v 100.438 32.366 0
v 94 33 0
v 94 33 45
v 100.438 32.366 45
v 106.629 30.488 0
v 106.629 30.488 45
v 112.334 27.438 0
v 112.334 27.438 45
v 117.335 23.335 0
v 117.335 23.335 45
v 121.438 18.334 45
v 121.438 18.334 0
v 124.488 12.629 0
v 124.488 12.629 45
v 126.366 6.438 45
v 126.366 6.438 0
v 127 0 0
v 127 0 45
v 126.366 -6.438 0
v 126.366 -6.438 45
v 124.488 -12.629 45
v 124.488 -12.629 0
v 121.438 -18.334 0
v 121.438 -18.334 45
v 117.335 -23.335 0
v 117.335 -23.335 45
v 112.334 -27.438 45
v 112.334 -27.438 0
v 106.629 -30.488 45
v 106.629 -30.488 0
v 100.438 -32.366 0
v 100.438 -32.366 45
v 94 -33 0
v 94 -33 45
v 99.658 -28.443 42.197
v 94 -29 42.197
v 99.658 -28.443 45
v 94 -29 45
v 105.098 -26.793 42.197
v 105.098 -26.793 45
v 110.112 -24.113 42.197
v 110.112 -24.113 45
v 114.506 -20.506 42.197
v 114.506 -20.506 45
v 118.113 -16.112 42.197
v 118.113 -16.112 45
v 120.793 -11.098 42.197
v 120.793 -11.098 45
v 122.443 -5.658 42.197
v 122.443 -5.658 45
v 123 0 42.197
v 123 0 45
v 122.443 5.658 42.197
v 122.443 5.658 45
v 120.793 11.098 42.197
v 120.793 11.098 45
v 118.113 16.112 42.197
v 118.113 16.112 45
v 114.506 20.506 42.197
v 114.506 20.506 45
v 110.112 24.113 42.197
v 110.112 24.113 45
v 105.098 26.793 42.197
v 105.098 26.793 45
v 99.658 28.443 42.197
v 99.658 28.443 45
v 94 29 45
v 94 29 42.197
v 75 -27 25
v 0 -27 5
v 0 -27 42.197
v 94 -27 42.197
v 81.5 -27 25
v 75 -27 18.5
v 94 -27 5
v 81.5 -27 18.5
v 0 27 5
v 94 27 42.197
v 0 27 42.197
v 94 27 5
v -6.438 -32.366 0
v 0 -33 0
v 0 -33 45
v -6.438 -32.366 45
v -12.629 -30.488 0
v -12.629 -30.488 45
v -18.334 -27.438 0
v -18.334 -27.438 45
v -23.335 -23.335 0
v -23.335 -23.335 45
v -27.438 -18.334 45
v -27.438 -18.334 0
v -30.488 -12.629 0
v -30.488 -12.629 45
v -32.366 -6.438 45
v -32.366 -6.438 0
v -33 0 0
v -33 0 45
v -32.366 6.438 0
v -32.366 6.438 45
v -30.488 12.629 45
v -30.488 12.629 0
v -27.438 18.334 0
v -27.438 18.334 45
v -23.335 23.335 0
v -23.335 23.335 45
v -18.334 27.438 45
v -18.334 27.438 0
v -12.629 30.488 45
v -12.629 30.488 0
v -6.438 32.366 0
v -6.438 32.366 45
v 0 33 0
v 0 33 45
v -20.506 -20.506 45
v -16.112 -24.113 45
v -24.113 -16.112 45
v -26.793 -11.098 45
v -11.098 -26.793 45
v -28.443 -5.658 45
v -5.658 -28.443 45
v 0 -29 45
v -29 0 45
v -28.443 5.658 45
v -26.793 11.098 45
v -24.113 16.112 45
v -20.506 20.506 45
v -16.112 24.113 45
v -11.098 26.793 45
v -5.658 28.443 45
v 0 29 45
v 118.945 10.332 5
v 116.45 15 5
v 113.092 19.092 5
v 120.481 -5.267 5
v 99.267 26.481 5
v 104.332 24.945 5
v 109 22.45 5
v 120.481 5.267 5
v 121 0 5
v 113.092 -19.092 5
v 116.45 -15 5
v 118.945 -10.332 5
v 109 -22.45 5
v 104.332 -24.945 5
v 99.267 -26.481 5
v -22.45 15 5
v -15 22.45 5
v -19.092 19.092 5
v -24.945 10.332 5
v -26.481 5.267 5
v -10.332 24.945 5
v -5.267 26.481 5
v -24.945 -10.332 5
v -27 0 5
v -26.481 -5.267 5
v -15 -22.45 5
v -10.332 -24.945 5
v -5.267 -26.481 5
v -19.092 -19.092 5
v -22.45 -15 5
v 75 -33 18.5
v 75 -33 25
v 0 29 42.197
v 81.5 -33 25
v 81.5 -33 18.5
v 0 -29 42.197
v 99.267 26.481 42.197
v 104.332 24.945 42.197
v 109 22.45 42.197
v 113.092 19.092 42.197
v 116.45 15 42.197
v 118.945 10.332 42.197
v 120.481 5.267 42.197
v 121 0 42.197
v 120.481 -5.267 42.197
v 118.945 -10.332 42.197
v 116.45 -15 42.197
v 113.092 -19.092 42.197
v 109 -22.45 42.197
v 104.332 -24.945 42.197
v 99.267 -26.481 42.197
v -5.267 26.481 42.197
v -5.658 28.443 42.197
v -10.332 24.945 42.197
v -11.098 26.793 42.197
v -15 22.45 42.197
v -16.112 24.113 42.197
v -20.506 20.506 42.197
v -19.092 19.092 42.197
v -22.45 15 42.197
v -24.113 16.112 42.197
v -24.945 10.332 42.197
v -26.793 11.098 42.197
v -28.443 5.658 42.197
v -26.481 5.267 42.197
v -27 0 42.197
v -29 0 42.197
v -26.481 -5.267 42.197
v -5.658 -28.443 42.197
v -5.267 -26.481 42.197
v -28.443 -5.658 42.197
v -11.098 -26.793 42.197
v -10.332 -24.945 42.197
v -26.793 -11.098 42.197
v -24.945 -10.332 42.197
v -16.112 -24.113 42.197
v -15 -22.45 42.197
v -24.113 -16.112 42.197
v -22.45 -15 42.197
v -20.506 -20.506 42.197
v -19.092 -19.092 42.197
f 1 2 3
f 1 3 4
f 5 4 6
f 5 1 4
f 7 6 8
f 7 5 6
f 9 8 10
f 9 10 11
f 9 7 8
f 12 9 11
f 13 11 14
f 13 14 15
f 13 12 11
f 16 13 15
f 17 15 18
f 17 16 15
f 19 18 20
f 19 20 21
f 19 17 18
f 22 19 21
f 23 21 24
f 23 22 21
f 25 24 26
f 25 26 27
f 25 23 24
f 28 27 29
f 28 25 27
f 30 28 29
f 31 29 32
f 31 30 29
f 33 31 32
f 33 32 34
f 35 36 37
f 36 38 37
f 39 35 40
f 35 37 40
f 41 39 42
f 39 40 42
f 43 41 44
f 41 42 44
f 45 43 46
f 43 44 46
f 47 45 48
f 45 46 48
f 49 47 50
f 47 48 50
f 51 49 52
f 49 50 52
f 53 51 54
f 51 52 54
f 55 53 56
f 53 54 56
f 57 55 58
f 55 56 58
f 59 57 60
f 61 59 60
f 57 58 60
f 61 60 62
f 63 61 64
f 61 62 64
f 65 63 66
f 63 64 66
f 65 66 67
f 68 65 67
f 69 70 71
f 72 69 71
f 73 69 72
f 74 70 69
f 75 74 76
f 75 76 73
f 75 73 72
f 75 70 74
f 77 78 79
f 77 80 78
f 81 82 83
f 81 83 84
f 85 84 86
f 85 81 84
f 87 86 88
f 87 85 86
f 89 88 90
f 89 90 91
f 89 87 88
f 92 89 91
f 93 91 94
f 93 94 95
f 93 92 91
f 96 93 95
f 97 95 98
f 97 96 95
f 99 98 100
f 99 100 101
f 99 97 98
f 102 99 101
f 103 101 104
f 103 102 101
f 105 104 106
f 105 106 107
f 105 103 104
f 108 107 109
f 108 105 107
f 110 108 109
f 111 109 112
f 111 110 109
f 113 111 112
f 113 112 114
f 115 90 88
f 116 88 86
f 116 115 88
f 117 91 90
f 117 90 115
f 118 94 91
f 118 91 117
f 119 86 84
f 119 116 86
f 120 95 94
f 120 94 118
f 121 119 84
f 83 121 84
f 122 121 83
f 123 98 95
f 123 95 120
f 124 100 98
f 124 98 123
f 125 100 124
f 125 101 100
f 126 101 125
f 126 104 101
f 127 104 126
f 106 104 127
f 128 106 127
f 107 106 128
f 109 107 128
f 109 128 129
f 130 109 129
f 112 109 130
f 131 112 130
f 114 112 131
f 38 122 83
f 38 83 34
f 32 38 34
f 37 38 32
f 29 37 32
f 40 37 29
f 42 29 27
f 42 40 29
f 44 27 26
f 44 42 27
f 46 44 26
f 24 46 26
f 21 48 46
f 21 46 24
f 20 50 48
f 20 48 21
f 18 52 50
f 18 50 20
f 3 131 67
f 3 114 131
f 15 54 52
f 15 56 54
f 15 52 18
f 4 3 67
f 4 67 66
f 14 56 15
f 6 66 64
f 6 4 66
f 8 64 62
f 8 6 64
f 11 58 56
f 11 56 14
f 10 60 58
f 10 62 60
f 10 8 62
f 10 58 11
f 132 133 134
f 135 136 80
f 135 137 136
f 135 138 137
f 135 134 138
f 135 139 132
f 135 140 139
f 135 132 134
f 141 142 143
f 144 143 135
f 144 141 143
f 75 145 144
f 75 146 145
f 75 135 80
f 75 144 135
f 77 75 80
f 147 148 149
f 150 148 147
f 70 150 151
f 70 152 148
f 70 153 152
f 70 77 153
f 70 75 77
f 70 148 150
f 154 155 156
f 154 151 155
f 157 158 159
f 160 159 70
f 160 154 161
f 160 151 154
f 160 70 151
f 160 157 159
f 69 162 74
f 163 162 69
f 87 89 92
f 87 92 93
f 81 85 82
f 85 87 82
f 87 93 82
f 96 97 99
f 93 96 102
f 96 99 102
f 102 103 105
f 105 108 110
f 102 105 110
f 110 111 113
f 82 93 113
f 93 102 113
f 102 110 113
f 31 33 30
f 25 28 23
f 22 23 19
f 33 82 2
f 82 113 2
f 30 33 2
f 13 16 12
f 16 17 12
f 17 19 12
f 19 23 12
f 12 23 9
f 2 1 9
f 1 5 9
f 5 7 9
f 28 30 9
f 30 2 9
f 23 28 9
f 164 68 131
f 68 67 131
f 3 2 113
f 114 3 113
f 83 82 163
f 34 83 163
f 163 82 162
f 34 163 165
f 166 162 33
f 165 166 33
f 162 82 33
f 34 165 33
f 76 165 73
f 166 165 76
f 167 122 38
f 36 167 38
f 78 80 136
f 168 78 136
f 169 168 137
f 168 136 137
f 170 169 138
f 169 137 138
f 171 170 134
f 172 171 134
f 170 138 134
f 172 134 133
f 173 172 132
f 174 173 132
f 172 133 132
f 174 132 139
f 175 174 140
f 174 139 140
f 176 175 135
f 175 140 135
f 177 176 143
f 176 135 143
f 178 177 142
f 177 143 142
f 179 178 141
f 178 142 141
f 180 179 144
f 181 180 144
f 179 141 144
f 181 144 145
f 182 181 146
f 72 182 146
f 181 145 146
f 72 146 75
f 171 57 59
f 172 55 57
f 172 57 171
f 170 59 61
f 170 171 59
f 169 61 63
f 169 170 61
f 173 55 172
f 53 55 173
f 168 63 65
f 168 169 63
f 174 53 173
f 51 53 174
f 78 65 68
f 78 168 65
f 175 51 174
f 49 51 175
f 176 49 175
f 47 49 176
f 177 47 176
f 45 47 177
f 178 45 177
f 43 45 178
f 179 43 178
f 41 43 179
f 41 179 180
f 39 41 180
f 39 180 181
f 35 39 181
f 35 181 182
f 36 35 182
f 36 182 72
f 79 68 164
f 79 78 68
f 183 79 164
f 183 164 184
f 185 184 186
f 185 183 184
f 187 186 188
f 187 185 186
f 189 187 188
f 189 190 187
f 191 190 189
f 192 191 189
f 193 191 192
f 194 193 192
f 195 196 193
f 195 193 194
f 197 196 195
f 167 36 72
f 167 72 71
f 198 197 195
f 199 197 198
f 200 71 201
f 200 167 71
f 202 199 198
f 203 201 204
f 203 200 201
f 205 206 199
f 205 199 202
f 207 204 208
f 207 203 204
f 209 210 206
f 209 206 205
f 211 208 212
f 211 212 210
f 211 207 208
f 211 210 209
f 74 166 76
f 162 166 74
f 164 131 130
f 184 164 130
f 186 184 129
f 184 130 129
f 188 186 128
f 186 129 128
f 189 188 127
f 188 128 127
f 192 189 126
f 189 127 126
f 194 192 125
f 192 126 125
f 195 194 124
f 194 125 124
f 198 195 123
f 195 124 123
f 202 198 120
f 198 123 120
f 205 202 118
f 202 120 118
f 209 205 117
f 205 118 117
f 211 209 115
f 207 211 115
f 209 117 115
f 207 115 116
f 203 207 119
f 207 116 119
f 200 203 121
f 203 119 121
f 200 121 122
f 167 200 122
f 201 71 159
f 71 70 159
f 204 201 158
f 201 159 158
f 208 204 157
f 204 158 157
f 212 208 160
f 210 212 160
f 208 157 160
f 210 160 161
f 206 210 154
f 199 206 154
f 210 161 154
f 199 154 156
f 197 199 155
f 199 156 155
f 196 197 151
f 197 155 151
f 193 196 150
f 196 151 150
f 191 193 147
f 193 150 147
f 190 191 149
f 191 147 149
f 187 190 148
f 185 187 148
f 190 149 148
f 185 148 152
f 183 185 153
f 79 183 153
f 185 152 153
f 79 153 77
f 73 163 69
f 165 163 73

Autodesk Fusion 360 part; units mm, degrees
sketch "Sketch1" plane through (0, 0, 0) normal (0, 0, 1) x (1, 0, 0)
  line L0 (0, -33) -> (94, -33)
  arc A0 (94, -33) -> (94, 33) centre (94, 0) ccw
  line L1 (94, 33) -> (0, 33)
  arc A1 (0, 33) -> (0, -33) centre (0, 0) ccw
  line L2 (0, 0) -> (94, 0) construction
  point P0 (-33, 0)
  point P1 (127, 0)
  dimension "d1" = 94
  dimension "d2" = 66
  dimension "d3" = 33
  dimension "d4" = 160
extrude "Extrude1" add sketch "Sketch1" along normal blind 40
move_face "OffsetFaces1" offset 5 1 faces at (62.6667, -11, 40)
sketch "Sketch2" plane through (0, 0, 45) normal (0, 0, 1) x (-1, 0, 0)
  arc A0 (0, -33) -> (0, 33) centre (0, 0) ccw
  line L0 (0, 33) -> (-94, 33)
  arc A1 (-94, 33) -> (-94, -33) centre (-94, 0) ccw
  line L1 (-94, -33) -> (0, -33)
  line L2 (0, 29) -> (-94, 29)
  arc A2 (-94, 29) -> (-94, -29) centre (-94, 0) ccw
  line L3 (-94, -29) -> (0, -29)
  arc A3 (0, -29) -> (0, 29) centre (0, 0) ccw
  dimension "d8" = -4
extrude "Extrude2" cut sketch "Sketch2" against normal blind 40 contours L2 A2 L3 A3
sketch "Sketch3" plane through (0, 0, 5) normal (0, 0, 1) x (-1, 0, 0)
  arc A0 (0, -29) -> (0, 29) centre (0, 0) ccw
  line L0 (0, 29) -> (-94, 29)
  arc A1 (-94, 29) -> (-94, -29) centre (-94, 0) ccw
  line L1 (-94, -29) -> (0, -29)
  line L2 (0, 27) -> (-94, 27)
  arc A2 (-94, 27) -> (-94, -27) centre (-94, 0) ccw
  line L3 (-94, -27) -> (0, -27)
  arc A3 (0, -27) -> (0, 27) centre (0, 0) ccw
  dimension "d11" = -2
sketch "Sketch4" plane through (0, 0, 5) normal (0, 0, 1) x (-1, 0, 0)
  arc A0 (0, -29) -> (0, 29) centre (0, 0) ccw
  line L0 (0, 29) -> (-94, 29)
  arc A1 (-94, 29) -> (-94, -29) centre (-94, 0) ccw
  line L1 (-94, -29) -> (0, -29)
extrude "Extrude3" add sketch "Sketch3" along normal blind 2
move_face "MoveFace1" by (0, 0, 30) 1 faces at (31.3333, 28.3333, 7)
move_face "MoveFace2" by (0, 0, 7.8672) 1 faces at (31.3333, 28.3333, 37)
move_face "MoveFace3" by (0, 0, 0.08) 1 faces at (31.3333, 28.3333, 44.8672)
move_face "MoveFace4" by (0, 0, 0.05) 1 faces at (31.3333, 28.3333, 44.9472)
move_face "MoveFace5" by (0, -5, -2.8) 1 faces at (31.3333, 28.3333, 44.9972)
sketch "Sketch5" plane through (0, 0, 0) normal (0, 0, 1) x (1, 0, 0)
sketch "Sketch6" plane through (0, 0, 0) normal (0, 0, 1) x (1, 0, 0)
  line L0 (-20, 10) -> (35, 10)
  line L1 (35, 10) -> (35, -20)
  line L2 (35, -20) -> (-20, -20)
  line L3 (-20, -20) -> (-20, 10)
sketch "Sketch8" plane through (0, 0, 0) normal (0, 0, -1) x (1, 0, 0)
  arc A0 (0, 33) -> (0, -33) centre (0, 0) ccw
  line L0 (0, -33) -> (94, -33)
  arc A1 (94, -33) -> (94, 33) centre (94, 0) ccw
  line L1 (94, 33) -> (0, 33)
sketch "Sketch9" plane through (0, -33, 0) normal (0, -1, 0) x (1, 0, 0)
  line L0 (0, 0) -> (94, 0)
  line L1 (94, 0) -> (94, 45)
  line L2 (94, 45) -> (0, 45)
  line L3 (0, 45) -> (0, 0)
  line L4 (75, 25) -> (81.5, 25)
  line L5 (81.5, 25) -> (81.5, 18.5)
  line L6 (81.5, 18.5) -> (75, 18.5)
  line L7 (75, 18.5) -> (75, 25)
  dimension "d22" = 6.5
  dimension "d23" = 6.5
extrude "Extrude7" cut sketch "Sketch9" against normal blind 15 contours L4 L5 L6 L7
